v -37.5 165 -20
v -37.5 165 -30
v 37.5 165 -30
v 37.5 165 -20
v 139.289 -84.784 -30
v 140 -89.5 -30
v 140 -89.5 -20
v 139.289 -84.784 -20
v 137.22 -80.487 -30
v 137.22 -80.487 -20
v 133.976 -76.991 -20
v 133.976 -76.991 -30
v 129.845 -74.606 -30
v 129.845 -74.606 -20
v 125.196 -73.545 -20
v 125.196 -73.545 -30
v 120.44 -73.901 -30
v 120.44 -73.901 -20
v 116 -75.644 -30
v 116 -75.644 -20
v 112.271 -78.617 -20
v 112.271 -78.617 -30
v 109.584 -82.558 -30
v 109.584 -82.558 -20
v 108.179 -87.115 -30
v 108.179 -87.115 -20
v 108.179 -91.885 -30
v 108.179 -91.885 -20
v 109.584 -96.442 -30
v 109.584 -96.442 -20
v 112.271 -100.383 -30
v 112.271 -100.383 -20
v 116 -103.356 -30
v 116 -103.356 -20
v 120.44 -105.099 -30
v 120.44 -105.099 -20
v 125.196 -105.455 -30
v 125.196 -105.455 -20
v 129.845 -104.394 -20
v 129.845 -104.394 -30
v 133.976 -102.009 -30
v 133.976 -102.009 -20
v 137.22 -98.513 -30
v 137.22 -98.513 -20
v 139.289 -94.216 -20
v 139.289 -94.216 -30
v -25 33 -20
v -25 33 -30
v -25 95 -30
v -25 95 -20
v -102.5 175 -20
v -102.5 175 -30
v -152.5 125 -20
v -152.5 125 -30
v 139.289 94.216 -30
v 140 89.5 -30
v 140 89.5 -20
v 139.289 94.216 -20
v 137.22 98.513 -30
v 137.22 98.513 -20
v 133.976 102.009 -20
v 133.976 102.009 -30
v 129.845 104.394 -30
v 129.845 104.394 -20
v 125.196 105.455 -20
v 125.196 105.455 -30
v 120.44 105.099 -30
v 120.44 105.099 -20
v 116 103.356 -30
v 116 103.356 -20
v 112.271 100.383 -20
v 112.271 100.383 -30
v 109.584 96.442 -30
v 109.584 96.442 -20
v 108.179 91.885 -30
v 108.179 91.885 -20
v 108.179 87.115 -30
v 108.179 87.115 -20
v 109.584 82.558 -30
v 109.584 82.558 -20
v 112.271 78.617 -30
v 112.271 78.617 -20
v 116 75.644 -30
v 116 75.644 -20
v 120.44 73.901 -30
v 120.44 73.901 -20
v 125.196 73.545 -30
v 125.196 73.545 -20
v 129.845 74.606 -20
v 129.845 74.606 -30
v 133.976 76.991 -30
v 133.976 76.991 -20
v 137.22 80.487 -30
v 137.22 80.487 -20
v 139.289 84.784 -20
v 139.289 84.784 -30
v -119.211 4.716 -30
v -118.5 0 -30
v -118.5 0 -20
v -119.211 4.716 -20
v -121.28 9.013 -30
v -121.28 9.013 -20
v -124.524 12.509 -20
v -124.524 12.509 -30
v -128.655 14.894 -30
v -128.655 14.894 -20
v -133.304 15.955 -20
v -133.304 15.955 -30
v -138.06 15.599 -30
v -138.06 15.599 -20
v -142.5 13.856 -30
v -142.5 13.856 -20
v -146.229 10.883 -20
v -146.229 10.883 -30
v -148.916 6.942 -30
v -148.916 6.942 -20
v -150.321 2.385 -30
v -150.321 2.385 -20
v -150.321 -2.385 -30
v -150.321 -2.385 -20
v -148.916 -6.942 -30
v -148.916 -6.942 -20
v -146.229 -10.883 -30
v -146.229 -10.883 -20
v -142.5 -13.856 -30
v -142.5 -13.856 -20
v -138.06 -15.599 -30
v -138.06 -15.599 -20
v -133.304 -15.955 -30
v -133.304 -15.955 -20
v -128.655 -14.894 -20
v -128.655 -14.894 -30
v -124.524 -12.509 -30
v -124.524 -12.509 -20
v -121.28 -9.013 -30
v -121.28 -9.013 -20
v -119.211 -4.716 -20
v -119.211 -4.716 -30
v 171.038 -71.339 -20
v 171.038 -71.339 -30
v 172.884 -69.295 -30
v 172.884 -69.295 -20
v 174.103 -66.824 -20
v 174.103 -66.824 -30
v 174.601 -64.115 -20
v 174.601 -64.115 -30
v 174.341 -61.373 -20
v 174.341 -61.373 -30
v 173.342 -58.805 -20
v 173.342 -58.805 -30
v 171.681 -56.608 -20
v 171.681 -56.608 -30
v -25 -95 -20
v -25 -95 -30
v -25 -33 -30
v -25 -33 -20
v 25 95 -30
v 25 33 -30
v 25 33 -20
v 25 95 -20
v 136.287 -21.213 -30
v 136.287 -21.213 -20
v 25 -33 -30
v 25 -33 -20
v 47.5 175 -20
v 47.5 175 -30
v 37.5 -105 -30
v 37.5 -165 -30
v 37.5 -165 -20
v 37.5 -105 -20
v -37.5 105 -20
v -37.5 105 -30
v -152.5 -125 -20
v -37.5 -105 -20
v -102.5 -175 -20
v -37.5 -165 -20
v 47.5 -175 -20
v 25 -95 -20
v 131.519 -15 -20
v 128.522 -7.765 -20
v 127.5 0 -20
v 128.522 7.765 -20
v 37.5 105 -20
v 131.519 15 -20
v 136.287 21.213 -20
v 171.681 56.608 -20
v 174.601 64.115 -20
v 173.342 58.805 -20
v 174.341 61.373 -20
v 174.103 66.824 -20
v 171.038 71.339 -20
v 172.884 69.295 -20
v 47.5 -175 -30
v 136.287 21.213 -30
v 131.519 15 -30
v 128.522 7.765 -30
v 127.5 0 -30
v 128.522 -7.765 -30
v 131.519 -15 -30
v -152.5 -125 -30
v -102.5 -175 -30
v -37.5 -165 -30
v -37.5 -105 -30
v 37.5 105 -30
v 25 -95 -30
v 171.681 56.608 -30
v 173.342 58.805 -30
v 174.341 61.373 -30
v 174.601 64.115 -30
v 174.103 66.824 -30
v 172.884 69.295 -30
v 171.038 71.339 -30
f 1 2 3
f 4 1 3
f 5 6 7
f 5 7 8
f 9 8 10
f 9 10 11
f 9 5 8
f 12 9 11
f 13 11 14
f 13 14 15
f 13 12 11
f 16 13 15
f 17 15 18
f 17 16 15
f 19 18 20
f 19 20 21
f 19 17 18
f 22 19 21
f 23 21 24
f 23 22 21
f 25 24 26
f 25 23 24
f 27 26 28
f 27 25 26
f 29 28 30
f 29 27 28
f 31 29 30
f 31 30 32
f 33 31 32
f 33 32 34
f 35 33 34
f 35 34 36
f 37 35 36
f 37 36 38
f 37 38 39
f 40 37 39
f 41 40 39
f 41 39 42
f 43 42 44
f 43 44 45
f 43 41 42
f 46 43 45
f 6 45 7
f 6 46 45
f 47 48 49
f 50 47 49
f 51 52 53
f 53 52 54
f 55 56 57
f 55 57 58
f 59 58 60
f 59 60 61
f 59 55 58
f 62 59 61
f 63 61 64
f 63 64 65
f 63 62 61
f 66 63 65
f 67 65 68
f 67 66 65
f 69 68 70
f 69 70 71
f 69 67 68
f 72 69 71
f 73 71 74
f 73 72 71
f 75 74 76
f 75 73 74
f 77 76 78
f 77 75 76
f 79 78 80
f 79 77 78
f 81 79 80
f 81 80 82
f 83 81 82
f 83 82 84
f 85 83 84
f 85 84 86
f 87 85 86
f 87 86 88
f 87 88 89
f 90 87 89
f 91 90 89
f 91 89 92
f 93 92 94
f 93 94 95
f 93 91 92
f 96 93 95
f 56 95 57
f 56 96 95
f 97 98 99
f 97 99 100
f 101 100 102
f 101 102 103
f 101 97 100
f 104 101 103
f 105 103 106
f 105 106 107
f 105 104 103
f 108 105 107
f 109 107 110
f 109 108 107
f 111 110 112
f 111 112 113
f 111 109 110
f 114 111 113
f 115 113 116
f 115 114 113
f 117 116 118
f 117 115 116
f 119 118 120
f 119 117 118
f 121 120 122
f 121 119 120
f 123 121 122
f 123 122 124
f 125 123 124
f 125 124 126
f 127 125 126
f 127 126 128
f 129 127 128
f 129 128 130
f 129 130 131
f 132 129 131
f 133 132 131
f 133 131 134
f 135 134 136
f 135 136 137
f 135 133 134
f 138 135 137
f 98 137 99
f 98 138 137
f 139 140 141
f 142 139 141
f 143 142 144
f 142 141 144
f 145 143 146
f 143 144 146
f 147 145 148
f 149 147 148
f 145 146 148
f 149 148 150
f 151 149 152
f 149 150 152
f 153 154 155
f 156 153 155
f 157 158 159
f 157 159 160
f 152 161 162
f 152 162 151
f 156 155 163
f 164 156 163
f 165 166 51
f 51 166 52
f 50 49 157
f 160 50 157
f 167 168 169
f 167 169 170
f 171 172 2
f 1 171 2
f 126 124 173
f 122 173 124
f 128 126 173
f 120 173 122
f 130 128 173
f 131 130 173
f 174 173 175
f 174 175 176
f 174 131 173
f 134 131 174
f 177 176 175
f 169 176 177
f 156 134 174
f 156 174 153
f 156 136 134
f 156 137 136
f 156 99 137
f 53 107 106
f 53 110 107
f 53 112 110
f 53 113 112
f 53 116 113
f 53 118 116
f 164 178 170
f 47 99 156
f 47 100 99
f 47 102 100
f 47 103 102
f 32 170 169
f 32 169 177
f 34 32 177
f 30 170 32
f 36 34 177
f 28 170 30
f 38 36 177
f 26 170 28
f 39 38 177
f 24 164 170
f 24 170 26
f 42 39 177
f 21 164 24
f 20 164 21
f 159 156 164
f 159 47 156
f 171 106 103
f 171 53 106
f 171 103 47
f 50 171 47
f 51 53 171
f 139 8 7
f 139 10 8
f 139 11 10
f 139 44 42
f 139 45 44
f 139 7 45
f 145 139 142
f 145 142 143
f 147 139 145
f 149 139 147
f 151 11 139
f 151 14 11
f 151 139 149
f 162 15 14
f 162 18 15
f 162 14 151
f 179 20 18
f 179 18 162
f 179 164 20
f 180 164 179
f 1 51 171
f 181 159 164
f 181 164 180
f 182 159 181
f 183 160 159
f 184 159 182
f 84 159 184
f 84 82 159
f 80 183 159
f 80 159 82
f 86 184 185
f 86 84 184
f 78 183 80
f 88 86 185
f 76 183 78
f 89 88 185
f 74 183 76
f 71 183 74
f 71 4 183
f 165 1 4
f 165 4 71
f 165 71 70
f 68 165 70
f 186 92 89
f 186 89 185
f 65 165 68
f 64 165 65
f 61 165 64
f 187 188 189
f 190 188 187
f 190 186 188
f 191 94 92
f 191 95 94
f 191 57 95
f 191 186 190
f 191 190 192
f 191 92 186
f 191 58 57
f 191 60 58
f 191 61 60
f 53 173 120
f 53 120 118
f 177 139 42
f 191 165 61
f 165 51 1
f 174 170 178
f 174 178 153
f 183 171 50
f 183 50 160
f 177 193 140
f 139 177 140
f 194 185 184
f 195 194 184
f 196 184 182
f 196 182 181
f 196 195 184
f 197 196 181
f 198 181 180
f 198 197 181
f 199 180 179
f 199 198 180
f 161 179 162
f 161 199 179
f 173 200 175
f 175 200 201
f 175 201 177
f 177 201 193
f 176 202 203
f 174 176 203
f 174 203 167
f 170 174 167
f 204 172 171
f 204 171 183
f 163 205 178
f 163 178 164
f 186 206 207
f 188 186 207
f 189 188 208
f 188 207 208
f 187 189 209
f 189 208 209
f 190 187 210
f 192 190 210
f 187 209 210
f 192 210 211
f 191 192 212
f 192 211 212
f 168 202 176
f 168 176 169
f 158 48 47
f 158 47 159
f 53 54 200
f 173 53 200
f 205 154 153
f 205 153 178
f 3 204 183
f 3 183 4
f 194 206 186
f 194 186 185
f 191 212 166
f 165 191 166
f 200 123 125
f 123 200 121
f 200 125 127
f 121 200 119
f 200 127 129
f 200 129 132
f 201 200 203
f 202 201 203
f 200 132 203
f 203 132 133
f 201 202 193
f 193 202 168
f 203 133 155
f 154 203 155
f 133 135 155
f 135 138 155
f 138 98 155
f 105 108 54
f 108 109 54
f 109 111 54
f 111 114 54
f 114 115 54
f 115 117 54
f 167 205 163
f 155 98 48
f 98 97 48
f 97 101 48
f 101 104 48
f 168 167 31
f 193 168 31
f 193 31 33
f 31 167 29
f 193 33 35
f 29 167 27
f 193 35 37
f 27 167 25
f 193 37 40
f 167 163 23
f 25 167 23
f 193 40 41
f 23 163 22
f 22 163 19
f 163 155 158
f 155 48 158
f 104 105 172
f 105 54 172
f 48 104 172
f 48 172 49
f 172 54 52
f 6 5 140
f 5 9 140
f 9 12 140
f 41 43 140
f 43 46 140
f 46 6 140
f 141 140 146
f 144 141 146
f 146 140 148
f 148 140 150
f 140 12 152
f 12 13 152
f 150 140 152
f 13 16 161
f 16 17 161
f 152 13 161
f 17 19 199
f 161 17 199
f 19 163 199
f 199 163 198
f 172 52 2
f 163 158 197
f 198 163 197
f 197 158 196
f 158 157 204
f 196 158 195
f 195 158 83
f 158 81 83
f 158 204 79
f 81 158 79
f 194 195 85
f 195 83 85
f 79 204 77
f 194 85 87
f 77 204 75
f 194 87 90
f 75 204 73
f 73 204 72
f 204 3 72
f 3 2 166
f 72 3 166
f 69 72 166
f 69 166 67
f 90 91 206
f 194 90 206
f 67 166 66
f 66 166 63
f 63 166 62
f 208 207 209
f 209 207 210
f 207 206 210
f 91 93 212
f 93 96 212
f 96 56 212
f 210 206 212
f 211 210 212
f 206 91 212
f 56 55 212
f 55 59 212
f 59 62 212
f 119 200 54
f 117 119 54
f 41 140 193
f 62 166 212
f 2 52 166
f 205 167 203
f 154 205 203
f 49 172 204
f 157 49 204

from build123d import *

# Parameters (mm, degrees)
SKETCH_R      = 16
SKETCH_W      = 75
SKETCH_H      = 60
SKETCH_W_2    = 50
SKETCH_H_2    = 62
EXTRUDE_DEPTH = 10


with BuildPart() as part:
    # Sketch → Extrude (new body)
    with BuildSketch(Plane.XY):
        with BuildLine():
            Line((-152.5, 125), (-152.5, -125))
            Line((-152.5, -125), (-102.5, -175))
            Line((-102.5, -175), (47.5, -175))
            Line((47.5, -175), (171.038135, -71.339197))
            ThreePointArc((171.038135, -71.339197), (174.600715, -64.114951), (171.6813, -56.607707))
            Line((136.286797, -21.213204), (171.6813, -56.607707))
            ThreePointArc((136.286797, 21.213204), (127.5, 0), (136.286797, -21.213204))
            Line((171.6813, 56.607707), (136.286797, 21.213204))
            ThreePointArc((171.6813, 56.607707), (174.600715, 64.114951), (171.038135, 71.339197))
            Line((171.038135, 71.339197), (47.5, 175))
            Line((47.5, 175), (-102.5, 175))
            Line((-102.5, 175), (-152.5, 125))
        make_face()
        with Locations((124, 89.5)):
            Circle(SKETCH_R, mode=Mode.SUBTRACT)
        with Locations((124, -89.5)):
            Circle(SKETCH_R, mode=Mode.SUBTRACT)
        with Locations((-134.5, 0)):
            Circle(SKETCH_R, mode=Mode.SUBTRACT)
        with Locations((0, 135)):
            Rectangle(SKETCH_W, SKETCH_H, mode=Mode.SUBTRACT)
        with Locations((0, -135)):
            Rectangle(SKETCH_W, SKETCH_H, mode=Mode.SUBTRACT)
        with Locations((0, 64)):
            Rectangle(SKETCH_W_2, SKETCH_H_2, mode=Mode.SUBTRACT)
        with Locations((0, -64)):
            Rectangle(SKETCH_W_2, SKETCH_H_2, mode=Mode.SUBTRACT)
    extrude(amount=EXTRUDE_DEPTH)


with BuildPart() as part_1:
    # Extrude placement: moved
    add(part.part.moved(Location((0, 0, -30))))


solid = part_1.part
